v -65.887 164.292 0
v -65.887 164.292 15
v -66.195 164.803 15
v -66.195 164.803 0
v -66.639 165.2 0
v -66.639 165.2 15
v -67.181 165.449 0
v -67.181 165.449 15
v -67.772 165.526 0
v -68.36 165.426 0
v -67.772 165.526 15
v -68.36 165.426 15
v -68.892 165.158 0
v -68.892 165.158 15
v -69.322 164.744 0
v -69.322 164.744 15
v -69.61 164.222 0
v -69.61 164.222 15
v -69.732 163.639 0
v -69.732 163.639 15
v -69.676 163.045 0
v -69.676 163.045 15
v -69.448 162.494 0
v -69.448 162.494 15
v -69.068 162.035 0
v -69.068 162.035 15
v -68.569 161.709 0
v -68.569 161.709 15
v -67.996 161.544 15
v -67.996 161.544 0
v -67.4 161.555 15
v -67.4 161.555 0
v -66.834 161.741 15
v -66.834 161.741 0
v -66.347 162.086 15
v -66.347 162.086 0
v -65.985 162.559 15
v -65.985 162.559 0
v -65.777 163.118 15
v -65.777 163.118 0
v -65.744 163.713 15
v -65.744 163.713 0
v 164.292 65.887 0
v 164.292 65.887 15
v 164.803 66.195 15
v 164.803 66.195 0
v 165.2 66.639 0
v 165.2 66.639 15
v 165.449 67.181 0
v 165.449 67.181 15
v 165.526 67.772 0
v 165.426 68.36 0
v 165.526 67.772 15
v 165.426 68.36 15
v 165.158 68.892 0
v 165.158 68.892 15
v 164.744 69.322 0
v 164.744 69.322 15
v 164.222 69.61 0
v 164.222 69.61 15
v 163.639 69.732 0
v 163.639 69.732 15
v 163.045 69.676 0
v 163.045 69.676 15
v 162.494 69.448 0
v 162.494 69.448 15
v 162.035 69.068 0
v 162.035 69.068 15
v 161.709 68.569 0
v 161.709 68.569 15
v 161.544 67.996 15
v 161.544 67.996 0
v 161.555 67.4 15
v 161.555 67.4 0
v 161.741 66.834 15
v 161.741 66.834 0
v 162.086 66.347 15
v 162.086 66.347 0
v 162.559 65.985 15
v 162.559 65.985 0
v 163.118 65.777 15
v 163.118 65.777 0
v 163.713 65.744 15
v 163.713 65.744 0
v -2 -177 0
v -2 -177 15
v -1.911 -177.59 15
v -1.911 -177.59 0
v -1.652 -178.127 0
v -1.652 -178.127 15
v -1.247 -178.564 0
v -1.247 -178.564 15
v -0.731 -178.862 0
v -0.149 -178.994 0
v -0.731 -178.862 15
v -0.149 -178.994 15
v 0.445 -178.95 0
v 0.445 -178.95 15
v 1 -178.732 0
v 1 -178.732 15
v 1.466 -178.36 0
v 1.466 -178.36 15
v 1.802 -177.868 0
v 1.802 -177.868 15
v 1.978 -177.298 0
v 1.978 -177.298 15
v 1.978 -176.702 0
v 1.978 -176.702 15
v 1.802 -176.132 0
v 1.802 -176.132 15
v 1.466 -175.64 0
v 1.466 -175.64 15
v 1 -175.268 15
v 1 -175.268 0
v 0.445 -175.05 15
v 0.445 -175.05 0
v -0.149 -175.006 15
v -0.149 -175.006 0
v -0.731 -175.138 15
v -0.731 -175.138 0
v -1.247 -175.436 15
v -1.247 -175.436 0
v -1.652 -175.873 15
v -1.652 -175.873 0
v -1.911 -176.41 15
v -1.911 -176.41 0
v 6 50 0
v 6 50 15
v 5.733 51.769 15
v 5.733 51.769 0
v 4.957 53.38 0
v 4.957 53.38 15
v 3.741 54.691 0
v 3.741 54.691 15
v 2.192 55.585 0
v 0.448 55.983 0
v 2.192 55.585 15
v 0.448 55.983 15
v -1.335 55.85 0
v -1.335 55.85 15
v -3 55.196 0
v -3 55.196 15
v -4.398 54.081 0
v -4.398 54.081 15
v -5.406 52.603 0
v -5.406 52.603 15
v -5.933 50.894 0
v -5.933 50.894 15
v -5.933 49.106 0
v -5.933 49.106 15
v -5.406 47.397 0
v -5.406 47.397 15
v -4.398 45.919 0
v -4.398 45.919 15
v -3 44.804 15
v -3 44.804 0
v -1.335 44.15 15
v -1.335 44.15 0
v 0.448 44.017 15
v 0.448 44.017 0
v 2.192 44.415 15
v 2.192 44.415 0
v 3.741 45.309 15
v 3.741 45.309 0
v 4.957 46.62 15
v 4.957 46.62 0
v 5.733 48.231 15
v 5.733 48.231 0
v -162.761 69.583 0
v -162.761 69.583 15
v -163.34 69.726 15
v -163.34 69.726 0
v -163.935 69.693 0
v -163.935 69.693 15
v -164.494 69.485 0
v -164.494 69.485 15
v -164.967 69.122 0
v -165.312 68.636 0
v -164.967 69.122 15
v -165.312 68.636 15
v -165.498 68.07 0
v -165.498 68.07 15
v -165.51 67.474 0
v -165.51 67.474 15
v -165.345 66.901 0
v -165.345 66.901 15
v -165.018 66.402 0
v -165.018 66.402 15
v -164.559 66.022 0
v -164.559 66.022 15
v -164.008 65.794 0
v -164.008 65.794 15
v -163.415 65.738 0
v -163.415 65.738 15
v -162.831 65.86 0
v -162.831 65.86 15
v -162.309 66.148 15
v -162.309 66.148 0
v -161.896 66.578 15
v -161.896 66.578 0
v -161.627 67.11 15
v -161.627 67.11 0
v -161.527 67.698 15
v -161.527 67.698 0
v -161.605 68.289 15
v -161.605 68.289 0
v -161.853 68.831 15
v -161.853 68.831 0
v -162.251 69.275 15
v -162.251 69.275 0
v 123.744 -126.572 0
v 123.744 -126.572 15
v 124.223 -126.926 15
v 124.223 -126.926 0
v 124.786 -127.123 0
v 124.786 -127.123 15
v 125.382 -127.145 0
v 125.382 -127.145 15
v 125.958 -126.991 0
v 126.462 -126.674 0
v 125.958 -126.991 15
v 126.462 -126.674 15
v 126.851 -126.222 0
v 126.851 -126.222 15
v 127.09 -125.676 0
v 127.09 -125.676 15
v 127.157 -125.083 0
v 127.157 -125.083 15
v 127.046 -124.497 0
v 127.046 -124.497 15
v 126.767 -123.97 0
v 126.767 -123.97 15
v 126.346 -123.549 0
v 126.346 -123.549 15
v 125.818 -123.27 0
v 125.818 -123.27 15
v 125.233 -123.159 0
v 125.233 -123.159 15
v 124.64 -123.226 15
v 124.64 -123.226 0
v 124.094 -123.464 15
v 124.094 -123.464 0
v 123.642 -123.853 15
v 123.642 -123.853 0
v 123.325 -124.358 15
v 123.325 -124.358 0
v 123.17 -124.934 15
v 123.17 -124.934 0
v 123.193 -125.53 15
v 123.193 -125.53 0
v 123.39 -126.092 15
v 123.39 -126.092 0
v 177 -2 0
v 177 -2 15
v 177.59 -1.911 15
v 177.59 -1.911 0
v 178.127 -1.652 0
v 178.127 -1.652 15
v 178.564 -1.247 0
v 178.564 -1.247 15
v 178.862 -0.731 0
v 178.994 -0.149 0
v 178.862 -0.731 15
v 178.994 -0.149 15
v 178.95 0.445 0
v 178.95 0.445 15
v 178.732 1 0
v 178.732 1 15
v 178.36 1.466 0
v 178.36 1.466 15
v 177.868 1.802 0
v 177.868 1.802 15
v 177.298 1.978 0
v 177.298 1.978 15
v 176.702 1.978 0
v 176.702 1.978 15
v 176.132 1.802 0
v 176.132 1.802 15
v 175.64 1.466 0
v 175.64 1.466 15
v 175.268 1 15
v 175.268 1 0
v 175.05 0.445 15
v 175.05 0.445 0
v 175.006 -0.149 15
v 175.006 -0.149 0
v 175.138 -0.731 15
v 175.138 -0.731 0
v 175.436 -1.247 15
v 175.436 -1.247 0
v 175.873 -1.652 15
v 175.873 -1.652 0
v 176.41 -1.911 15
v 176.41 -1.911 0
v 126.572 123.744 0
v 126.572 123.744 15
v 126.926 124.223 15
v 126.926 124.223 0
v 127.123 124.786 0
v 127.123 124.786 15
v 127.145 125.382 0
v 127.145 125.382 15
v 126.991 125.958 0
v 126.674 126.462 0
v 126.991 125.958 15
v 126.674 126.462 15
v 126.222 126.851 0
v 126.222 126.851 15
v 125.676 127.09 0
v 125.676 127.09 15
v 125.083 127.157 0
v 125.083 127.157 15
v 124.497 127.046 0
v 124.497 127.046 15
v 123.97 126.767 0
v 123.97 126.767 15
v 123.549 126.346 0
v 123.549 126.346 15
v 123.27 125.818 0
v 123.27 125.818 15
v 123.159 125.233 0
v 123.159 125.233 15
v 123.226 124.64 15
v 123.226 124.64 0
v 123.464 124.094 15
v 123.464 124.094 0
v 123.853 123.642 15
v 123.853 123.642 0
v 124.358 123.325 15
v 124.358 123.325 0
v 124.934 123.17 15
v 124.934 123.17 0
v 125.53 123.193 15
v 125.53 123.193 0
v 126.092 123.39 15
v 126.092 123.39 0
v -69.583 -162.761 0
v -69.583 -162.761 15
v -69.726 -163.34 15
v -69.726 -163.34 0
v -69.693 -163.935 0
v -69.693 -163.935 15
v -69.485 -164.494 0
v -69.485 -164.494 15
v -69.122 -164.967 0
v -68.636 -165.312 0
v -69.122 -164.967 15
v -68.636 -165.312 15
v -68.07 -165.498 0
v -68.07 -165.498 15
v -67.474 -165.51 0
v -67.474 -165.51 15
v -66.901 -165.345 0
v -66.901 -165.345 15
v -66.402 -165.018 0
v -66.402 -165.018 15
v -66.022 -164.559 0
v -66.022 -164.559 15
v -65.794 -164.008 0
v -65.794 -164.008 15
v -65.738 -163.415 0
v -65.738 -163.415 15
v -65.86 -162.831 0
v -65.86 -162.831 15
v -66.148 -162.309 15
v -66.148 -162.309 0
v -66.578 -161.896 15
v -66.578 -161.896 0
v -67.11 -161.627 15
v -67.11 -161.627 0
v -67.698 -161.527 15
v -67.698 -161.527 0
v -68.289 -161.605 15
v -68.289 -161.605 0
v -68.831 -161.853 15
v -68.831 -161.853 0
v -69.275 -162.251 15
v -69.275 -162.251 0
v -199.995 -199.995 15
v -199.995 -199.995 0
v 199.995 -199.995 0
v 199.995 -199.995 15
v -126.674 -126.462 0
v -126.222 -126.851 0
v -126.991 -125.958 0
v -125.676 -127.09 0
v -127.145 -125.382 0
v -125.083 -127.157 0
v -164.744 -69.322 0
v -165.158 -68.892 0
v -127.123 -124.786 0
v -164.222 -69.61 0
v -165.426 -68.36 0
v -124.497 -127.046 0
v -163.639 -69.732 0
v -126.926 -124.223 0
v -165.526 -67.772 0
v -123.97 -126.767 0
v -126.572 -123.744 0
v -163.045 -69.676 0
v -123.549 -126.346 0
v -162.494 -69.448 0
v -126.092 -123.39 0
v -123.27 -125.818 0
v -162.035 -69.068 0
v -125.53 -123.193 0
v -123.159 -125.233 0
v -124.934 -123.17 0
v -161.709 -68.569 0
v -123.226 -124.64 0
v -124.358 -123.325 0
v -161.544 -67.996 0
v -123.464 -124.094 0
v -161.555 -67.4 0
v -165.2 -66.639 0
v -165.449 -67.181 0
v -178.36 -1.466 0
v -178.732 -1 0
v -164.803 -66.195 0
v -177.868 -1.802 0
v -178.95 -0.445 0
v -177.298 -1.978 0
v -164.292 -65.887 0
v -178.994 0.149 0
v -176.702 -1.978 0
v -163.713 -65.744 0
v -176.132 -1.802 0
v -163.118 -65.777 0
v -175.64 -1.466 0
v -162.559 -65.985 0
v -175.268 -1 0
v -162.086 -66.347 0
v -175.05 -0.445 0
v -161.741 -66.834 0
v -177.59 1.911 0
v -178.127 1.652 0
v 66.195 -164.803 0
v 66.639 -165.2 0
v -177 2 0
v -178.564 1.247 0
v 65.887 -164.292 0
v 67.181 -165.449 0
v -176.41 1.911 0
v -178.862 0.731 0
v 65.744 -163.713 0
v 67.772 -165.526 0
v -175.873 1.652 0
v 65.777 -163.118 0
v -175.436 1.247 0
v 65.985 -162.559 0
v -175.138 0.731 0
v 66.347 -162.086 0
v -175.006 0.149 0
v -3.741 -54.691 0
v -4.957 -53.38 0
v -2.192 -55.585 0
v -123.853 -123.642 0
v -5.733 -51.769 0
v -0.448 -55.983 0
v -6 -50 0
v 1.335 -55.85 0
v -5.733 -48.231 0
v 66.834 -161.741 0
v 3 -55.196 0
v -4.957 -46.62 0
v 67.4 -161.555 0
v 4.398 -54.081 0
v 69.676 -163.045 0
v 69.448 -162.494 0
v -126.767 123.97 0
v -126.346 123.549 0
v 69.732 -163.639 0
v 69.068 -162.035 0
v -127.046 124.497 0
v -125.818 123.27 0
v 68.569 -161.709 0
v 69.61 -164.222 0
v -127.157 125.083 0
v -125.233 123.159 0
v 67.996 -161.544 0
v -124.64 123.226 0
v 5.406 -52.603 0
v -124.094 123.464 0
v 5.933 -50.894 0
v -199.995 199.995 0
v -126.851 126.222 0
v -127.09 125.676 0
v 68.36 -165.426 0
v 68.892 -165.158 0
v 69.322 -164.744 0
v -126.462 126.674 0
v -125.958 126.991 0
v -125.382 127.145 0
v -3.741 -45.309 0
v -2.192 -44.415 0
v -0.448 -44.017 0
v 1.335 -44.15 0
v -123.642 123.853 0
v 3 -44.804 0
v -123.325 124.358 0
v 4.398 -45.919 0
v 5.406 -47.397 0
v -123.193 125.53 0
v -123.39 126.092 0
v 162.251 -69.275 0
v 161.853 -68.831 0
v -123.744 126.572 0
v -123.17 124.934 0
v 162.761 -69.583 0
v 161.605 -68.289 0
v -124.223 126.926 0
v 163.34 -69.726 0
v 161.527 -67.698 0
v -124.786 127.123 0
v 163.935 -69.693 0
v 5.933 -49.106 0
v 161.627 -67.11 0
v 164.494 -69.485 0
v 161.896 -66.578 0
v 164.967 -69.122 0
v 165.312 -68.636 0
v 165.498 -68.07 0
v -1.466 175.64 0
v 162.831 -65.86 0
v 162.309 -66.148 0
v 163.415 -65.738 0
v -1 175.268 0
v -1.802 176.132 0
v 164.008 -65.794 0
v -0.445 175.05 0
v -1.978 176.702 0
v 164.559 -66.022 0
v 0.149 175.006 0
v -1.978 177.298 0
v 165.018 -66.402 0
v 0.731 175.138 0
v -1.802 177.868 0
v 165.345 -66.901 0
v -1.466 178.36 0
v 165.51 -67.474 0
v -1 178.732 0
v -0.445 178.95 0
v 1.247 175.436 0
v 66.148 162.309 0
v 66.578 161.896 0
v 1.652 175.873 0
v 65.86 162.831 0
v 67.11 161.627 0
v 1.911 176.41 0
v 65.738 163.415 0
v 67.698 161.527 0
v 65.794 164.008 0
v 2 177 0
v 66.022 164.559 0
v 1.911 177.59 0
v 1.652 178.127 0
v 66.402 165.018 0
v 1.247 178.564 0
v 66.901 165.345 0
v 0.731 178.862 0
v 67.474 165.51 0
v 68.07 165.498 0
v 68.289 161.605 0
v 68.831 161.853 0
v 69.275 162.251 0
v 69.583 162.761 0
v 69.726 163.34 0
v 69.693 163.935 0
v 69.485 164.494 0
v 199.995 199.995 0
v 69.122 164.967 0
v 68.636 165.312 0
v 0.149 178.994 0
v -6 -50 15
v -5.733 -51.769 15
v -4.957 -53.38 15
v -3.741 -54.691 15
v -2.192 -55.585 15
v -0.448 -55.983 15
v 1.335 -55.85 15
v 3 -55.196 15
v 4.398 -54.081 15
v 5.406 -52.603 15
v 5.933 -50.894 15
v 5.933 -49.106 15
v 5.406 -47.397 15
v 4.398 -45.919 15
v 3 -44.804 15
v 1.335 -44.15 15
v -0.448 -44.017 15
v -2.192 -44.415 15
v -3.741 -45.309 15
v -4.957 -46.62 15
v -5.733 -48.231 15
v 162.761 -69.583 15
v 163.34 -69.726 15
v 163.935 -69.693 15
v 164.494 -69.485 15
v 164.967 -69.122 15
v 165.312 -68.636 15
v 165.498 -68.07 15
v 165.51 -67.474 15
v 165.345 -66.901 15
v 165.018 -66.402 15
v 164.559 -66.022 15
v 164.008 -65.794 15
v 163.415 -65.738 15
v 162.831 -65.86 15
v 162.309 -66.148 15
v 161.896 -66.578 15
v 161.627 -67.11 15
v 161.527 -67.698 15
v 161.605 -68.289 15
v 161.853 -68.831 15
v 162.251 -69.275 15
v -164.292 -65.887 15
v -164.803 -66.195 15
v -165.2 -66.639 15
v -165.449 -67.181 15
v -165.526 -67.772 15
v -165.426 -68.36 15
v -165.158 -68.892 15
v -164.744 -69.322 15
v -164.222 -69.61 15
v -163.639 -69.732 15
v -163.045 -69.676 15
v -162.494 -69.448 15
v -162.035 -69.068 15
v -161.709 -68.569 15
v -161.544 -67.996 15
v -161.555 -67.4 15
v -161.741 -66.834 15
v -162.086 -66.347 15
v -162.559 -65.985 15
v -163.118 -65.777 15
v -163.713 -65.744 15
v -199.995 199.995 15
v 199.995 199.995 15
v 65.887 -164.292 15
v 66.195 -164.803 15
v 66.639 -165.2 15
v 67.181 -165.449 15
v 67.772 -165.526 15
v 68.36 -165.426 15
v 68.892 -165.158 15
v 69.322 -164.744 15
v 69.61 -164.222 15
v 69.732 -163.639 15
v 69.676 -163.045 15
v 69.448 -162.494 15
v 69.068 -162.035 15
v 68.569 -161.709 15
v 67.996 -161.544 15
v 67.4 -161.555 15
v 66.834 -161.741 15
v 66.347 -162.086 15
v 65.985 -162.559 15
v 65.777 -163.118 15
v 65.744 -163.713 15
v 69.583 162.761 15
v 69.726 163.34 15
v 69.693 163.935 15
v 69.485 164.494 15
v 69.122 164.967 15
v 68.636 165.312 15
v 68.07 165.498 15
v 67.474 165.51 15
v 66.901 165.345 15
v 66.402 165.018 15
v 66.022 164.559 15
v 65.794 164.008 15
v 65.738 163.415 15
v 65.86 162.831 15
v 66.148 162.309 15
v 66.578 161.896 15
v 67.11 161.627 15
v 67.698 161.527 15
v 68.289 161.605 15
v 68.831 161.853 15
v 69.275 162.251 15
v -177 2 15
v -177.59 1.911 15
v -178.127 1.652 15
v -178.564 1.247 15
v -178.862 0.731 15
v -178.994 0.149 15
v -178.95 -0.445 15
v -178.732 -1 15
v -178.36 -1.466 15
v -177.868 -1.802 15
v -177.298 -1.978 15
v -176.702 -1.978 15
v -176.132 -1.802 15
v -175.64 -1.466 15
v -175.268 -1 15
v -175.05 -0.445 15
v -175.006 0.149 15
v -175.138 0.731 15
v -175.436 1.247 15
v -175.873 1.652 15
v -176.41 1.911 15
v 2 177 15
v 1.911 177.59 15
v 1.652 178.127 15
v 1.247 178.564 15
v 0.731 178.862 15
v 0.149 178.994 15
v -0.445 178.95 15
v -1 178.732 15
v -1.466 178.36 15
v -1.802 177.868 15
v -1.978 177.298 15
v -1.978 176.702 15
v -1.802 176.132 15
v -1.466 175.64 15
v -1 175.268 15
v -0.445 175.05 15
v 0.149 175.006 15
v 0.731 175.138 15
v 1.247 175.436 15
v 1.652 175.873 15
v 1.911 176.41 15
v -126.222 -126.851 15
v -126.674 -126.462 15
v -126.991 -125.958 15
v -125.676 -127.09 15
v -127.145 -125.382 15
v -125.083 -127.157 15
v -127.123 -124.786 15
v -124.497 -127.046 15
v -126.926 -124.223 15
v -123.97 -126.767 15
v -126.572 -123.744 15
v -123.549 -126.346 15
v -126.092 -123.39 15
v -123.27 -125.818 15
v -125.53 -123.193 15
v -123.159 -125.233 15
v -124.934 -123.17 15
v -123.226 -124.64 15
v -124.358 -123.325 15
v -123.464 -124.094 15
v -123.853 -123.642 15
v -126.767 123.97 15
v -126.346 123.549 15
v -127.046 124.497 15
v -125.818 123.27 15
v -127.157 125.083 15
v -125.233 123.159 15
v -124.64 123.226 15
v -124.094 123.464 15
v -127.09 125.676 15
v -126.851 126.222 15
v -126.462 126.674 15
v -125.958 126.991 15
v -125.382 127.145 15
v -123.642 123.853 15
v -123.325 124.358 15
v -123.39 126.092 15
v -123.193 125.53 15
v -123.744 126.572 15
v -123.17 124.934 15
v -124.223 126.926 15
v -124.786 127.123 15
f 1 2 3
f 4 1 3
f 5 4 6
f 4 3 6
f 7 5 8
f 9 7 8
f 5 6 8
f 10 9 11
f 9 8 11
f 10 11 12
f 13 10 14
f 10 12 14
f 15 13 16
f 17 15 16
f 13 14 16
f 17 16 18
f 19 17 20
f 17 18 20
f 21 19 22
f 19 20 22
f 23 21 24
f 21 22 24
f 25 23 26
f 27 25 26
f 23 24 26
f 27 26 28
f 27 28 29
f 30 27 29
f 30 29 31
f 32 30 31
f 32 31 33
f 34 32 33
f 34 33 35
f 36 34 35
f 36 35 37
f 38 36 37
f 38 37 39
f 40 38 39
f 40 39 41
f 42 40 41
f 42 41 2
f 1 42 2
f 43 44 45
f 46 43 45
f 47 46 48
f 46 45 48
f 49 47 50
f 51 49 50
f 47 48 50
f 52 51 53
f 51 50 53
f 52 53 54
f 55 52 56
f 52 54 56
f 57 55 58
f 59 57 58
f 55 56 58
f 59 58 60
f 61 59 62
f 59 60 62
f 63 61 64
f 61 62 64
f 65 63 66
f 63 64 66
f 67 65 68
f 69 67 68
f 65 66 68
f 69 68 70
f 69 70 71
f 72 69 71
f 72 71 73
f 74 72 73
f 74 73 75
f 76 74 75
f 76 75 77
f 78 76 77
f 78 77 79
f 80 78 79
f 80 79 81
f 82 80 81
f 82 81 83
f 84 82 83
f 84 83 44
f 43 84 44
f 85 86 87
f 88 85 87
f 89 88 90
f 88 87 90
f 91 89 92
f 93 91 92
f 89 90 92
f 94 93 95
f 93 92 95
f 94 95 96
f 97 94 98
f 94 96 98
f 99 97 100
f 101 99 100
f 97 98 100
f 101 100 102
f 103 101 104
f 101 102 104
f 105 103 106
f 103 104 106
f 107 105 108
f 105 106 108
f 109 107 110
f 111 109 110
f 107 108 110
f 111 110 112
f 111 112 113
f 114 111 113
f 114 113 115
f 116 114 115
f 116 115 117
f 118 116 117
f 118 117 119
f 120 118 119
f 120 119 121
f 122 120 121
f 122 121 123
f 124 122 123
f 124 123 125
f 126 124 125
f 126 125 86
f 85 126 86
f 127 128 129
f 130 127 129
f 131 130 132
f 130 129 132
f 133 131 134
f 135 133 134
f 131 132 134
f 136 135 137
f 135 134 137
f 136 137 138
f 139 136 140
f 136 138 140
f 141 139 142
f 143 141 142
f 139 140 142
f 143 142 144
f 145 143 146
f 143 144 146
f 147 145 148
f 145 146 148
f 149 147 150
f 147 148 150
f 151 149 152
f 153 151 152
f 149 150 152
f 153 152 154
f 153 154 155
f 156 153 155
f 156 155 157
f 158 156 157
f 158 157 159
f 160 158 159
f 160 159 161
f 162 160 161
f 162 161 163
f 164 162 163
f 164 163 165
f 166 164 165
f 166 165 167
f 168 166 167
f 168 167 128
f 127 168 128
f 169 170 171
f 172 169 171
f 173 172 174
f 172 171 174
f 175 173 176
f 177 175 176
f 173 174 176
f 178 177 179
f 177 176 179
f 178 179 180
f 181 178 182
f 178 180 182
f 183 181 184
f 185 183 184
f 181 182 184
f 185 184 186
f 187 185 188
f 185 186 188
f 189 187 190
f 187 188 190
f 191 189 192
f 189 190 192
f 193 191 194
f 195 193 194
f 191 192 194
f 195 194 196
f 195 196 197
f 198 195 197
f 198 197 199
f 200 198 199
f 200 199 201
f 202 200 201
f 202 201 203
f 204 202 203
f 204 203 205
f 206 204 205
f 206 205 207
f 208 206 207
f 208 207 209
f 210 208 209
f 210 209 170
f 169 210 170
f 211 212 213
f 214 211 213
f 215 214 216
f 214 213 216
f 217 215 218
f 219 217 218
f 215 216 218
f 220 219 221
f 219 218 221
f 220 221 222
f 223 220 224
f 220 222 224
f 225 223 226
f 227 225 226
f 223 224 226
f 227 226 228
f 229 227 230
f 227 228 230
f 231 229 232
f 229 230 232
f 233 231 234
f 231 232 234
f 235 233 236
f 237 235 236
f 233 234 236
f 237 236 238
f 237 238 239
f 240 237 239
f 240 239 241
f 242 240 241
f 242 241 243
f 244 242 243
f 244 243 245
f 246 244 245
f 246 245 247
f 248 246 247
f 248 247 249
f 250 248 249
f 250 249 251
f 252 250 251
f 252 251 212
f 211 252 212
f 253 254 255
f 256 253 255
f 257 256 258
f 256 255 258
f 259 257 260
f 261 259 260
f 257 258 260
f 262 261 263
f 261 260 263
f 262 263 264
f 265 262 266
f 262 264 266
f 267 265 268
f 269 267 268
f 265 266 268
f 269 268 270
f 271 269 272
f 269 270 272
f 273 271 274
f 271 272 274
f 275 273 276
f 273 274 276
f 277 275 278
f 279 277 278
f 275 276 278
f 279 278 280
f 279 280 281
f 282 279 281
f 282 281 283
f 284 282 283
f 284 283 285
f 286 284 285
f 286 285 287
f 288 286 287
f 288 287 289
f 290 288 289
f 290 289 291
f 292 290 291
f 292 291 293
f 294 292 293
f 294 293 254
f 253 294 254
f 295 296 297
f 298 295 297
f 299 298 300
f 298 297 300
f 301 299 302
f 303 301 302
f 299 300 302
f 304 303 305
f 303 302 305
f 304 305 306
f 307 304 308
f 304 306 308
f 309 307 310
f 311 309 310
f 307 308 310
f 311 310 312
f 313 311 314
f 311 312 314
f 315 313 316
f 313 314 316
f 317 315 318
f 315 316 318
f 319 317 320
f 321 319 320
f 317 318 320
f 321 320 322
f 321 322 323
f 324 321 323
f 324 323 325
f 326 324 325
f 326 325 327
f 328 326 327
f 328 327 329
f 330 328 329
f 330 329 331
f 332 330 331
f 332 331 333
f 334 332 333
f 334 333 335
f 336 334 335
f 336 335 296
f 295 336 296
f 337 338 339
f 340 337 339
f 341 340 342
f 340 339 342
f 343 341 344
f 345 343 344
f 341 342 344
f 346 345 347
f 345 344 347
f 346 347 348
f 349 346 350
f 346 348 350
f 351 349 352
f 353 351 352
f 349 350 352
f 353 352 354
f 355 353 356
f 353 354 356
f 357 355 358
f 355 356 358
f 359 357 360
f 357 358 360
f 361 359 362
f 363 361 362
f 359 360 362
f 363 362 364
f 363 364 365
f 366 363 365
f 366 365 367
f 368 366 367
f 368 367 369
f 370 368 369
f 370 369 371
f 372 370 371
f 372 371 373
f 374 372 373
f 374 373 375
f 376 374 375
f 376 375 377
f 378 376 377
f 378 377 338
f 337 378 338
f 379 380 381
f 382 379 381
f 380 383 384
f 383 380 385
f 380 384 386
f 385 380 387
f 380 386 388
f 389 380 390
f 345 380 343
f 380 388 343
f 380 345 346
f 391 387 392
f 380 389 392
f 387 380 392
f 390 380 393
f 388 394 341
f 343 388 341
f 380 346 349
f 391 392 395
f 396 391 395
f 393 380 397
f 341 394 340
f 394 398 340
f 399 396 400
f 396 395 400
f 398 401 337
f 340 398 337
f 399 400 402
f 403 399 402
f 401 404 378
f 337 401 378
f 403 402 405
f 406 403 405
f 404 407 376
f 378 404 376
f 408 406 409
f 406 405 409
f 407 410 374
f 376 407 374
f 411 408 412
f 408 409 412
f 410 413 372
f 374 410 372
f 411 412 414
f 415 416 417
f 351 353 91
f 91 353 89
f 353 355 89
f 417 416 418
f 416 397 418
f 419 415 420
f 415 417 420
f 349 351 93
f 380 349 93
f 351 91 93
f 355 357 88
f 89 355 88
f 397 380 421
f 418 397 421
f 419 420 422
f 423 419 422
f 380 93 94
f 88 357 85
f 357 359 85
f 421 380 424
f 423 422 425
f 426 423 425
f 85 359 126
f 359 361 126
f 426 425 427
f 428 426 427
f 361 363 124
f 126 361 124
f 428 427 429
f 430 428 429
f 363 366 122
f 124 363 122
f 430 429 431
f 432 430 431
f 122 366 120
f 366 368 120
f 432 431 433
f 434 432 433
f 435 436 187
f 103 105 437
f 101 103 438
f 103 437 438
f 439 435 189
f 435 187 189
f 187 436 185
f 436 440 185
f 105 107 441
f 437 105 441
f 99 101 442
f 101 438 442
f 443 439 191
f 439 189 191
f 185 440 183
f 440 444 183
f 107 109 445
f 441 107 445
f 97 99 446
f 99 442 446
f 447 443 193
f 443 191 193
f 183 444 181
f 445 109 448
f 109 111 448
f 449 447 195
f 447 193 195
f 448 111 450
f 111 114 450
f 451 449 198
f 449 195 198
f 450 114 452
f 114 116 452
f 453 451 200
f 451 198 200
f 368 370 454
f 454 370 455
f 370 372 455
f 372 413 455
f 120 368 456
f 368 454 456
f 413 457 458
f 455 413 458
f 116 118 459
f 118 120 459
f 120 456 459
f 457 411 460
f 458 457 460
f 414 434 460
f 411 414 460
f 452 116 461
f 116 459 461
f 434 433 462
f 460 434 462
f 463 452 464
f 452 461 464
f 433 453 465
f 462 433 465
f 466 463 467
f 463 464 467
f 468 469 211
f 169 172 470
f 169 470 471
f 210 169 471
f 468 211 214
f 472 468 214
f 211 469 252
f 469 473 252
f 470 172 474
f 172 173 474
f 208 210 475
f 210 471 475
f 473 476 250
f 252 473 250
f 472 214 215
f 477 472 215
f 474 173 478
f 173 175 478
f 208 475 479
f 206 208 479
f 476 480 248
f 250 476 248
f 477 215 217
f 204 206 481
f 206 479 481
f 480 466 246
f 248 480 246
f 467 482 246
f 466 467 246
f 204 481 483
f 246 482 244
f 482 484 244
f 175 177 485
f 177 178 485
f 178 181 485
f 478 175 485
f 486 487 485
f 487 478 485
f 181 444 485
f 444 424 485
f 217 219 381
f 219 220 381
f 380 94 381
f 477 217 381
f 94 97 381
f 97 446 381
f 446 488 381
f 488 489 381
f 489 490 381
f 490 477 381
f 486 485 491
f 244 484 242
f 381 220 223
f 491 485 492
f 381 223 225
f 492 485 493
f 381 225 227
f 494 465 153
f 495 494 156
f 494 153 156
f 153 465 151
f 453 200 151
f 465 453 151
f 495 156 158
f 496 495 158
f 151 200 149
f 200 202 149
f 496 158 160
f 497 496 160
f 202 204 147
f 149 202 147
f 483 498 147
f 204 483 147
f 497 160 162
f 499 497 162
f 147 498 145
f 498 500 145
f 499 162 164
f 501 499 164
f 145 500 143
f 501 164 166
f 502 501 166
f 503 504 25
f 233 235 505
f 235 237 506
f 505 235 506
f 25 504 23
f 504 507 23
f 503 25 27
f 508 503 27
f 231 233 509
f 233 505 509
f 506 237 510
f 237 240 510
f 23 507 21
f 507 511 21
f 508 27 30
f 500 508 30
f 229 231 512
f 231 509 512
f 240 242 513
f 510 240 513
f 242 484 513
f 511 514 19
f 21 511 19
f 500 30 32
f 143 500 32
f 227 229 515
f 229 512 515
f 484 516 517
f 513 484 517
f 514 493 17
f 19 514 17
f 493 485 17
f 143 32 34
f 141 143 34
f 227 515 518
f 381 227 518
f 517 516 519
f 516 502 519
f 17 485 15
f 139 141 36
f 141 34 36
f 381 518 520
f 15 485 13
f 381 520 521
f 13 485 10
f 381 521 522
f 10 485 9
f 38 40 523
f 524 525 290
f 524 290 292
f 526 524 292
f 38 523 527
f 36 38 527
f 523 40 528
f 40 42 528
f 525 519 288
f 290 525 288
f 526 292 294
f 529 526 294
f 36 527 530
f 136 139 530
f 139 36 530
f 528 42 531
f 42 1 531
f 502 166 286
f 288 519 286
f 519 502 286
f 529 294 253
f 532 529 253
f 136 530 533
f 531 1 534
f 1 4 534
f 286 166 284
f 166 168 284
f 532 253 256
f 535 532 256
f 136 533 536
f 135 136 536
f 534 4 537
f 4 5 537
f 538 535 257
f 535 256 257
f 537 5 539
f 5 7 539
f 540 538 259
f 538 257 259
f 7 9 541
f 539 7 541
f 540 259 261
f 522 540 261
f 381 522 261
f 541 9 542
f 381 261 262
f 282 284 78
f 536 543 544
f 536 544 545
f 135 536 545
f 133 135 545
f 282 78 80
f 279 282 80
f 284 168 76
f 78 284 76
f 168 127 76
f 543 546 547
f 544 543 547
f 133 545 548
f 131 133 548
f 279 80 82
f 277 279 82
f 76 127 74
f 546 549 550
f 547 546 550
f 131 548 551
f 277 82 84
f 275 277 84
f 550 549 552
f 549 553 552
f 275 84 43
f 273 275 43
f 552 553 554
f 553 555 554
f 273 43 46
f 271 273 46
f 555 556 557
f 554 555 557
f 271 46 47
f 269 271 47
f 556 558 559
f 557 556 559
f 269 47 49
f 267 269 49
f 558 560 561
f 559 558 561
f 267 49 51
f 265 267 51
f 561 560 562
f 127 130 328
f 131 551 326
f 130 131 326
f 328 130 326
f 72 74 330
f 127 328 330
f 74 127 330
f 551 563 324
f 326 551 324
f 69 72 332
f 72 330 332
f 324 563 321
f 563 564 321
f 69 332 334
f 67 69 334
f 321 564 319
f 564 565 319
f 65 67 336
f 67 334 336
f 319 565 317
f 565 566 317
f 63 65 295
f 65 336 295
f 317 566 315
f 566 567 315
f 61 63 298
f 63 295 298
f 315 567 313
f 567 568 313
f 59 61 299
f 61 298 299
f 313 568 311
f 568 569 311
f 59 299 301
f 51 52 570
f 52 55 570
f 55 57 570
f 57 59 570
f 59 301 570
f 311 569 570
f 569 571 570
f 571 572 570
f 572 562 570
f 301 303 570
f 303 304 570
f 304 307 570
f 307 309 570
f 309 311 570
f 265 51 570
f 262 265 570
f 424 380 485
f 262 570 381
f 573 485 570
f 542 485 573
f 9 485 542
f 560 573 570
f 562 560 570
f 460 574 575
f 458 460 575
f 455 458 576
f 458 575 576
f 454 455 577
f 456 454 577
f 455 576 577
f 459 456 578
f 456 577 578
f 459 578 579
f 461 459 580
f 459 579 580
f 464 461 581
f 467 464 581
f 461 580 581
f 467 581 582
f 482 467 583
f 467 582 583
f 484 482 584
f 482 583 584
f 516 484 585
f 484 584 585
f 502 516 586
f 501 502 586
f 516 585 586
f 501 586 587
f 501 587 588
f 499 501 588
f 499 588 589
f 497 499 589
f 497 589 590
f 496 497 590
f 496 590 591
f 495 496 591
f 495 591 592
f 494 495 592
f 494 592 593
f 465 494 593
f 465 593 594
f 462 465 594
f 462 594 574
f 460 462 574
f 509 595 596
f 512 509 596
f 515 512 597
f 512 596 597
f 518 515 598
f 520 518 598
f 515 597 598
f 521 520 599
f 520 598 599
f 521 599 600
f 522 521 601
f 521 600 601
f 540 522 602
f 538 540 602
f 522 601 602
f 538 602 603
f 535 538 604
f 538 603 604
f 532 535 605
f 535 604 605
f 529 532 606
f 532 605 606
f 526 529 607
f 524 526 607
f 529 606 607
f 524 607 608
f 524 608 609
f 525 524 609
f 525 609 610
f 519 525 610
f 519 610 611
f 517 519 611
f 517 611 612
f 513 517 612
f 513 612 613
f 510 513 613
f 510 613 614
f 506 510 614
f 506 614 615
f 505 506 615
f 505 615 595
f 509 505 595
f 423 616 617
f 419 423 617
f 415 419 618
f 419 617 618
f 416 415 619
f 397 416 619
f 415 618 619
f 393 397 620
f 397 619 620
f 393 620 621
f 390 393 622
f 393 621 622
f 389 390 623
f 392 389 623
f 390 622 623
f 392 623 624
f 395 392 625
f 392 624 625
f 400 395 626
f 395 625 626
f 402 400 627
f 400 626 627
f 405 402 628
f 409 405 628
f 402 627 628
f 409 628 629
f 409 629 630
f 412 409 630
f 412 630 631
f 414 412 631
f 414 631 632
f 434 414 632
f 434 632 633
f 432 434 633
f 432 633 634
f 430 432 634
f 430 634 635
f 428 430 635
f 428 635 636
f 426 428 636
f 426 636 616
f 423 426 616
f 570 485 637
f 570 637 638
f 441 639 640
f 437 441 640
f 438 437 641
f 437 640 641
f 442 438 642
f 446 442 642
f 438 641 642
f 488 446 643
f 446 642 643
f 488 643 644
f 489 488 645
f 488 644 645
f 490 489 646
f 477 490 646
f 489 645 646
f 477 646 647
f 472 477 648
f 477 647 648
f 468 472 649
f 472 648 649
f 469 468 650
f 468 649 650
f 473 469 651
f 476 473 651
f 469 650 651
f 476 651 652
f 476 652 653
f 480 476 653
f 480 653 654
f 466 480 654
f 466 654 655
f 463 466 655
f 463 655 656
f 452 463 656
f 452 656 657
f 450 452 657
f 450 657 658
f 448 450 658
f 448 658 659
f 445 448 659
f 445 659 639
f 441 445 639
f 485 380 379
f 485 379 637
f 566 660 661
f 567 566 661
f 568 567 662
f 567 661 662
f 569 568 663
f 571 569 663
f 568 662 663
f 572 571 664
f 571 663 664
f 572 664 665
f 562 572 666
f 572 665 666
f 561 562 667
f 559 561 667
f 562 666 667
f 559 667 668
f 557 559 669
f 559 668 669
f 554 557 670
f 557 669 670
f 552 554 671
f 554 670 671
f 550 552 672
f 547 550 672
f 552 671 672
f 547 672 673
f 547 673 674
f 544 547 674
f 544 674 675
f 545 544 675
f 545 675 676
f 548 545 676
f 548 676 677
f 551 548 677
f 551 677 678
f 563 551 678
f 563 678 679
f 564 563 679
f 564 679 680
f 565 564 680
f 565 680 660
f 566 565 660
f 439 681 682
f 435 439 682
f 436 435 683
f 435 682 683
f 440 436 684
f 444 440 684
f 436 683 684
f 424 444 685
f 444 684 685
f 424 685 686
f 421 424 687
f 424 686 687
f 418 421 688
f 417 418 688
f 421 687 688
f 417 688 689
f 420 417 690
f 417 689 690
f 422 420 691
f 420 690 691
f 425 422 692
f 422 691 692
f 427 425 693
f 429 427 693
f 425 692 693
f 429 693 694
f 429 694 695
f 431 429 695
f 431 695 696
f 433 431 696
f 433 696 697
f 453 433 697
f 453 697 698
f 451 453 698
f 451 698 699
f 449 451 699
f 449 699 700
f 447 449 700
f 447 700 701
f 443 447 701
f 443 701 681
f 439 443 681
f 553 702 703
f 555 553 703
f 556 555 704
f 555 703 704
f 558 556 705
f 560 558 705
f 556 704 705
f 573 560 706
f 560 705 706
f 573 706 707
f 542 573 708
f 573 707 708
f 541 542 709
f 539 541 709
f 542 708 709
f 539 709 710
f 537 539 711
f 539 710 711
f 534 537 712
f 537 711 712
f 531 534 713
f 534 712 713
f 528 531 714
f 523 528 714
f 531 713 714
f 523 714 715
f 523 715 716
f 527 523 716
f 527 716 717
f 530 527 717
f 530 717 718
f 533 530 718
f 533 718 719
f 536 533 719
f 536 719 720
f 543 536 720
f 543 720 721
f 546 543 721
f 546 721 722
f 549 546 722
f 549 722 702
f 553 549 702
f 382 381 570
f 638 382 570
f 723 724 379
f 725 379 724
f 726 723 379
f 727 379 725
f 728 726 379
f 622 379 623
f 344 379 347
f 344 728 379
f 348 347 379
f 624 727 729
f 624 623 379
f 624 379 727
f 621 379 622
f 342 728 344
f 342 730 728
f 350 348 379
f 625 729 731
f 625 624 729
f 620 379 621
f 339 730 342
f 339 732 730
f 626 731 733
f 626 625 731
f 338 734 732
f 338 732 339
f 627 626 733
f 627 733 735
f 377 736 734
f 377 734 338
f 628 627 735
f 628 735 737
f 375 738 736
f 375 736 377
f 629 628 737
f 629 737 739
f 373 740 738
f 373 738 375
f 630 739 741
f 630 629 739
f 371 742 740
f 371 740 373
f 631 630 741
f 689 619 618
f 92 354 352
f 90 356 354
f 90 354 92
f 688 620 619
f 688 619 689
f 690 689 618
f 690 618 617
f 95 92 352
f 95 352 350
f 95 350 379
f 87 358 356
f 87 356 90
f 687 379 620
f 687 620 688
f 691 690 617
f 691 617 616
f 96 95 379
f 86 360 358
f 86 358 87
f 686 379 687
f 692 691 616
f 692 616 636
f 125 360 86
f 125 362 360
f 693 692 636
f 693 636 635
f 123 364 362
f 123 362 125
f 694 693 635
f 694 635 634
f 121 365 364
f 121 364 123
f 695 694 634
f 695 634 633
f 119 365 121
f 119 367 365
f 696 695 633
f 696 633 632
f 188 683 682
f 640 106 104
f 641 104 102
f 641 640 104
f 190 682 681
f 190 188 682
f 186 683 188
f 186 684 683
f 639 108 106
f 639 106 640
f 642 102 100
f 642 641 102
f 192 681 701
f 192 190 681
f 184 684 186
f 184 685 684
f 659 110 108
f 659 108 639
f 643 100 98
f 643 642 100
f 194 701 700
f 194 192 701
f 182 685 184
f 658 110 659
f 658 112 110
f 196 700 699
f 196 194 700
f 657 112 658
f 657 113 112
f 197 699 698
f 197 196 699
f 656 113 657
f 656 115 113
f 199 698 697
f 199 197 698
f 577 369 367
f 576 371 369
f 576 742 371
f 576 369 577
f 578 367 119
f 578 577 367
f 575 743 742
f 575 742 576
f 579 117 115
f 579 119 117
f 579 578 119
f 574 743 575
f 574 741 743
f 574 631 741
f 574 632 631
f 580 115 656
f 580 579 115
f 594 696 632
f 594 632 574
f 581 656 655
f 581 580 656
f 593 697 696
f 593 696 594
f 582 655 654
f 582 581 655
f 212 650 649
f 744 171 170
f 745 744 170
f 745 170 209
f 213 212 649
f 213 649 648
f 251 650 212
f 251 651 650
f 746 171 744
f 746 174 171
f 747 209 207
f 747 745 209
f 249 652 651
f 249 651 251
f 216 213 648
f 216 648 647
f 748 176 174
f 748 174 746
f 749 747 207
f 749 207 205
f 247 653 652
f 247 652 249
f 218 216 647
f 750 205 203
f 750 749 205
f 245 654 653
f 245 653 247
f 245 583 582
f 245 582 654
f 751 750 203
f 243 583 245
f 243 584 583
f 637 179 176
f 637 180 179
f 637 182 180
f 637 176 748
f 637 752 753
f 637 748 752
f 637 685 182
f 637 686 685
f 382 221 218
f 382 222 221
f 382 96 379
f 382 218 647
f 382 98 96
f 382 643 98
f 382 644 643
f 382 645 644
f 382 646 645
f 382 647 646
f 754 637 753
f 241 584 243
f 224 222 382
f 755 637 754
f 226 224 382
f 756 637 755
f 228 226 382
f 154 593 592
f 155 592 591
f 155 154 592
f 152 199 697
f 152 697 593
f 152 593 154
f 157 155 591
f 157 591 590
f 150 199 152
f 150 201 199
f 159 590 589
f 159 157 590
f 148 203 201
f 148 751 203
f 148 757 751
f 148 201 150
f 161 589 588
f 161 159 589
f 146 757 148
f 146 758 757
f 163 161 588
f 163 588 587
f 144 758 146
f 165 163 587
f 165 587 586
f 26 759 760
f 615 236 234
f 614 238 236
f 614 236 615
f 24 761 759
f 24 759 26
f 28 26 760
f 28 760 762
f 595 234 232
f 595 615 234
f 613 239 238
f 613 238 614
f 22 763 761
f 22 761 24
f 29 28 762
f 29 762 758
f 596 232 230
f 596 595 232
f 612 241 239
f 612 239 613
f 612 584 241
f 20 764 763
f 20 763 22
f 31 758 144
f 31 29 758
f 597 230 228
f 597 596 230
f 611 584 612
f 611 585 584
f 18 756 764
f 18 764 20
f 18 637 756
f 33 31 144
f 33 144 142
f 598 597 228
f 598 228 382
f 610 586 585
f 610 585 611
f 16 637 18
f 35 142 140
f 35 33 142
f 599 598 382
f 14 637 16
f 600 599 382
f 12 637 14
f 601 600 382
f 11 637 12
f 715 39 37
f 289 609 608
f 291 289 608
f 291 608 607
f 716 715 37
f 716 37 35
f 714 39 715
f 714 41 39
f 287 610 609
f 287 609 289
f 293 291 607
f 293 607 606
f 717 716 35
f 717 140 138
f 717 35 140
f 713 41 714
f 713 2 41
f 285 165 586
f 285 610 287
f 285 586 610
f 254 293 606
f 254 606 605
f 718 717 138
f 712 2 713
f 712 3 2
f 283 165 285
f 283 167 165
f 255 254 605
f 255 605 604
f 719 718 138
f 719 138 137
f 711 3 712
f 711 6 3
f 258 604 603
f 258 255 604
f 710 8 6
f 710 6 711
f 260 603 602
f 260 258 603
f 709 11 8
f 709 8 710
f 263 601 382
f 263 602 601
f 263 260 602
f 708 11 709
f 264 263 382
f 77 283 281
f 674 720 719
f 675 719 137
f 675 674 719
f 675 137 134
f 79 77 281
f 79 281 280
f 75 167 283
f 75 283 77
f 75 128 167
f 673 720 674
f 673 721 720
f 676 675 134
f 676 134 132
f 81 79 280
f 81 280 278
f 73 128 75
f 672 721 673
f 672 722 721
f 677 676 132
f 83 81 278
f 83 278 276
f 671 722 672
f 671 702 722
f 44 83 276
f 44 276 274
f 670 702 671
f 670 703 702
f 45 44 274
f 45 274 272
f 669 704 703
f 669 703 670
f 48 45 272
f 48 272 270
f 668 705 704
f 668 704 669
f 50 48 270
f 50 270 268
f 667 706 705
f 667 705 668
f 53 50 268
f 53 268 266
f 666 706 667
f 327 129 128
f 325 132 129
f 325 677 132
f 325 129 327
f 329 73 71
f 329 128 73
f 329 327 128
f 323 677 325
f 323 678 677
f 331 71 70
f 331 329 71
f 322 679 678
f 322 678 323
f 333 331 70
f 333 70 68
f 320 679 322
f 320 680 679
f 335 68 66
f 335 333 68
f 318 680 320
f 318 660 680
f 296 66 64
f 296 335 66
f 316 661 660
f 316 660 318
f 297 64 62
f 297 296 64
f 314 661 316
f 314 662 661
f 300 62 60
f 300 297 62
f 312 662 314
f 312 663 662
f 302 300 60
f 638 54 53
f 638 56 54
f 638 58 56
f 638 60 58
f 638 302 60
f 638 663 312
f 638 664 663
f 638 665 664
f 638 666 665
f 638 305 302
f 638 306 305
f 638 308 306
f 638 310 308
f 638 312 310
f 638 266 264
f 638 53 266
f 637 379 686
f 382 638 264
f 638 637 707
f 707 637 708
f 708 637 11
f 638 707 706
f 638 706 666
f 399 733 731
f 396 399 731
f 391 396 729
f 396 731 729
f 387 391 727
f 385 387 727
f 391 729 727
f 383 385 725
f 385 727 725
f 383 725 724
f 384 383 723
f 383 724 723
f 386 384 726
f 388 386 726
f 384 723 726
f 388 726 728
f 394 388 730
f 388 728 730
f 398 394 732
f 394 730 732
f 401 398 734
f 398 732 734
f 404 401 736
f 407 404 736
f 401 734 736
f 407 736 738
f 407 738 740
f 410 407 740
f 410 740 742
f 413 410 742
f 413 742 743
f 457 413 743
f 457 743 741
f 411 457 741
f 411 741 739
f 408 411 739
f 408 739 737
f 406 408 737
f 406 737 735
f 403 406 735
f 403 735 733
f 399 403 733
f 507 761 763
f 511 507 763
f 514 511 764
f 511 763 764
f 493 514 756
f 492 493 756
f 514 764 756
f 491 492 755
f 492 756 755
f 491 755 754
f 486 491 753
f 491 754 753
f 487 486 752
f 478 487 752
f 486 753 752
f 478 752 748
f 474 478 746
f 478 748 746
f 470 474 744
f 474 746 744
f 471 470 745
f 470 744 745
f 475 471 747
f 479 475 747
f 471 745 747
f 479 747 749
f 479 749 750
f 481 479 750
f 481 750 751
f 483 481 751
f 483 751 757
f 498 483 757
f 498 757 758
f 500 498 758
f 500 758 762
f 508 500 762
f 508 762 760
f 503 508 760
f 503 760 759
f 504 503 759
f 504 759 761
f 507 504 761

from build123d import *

# Parameters (mm, degrees)
SKETCH_W              = 399.99
SKETCH_H              = 399.99
PAD_DEPTH             = 15
SKETCH001_R           = 6
POCKET_DEPTH          = 1146.741253
SKETCH002_R           = 2
POCKET001_DEPTH       = 1146.741253
POLARPATTERN_COUNT    = 16
POLARPATTERN001_COUNT = 2


with BuildPart() as part:
    # Sketch → Pad (new body)
    with BuildSketch(Plane.XY):
        Rectangle(SKETCH_W, SKETCH_H)
    extrude(amount=PAD_DEPTH)

    # Sketch001 (on Face6 of Pad) → Pocket (cut, through all)
    with BuildSketch(Plane.XY.offset(15)):
        with Locations((0, 50)):
            Circle(SKETCH001_R)
    pocket = extrude(amount=-POCKET_DEPTH, mode=Mode.SUBTRACT)

    # Sketch002 (on Face5 of Pocket) → Pocket001 (cut, through all)
    with BuildSketch(Plane.XY.offset(15)):
        with Locations((0, 177)):
            Circle(SKETCH002_R)
    pocket001 = extrude(amount=-POCKET001_DEPTH, mode=Mode.SUBTRACT)

    # PolarPattern: Pocket001 ×16 about axis
    polarpattern_axis = Axis((0, 0, 15), (0, 0, 1))
    for i in range(1, POLARPATTERN_COUNT):
        add(pocket001.rotate(polarpattern_axis, i * 360 / POLARPATTERN_COUNT), mode=Mode.SUBTRACT)

    # PolarPattern001: Pocket ×2 about axis
    polarpattern001_axis = Axis((0, 0, 15), (0, 0, 1))
    for i in range(1, POLARPATTERN001_COUNT):
        add(pocket.rotate(polarpattern001_axis, i * 360 / POLARPATTERN001_COUNT), mode=Mode.SUBTRACT)


solid = part.part
